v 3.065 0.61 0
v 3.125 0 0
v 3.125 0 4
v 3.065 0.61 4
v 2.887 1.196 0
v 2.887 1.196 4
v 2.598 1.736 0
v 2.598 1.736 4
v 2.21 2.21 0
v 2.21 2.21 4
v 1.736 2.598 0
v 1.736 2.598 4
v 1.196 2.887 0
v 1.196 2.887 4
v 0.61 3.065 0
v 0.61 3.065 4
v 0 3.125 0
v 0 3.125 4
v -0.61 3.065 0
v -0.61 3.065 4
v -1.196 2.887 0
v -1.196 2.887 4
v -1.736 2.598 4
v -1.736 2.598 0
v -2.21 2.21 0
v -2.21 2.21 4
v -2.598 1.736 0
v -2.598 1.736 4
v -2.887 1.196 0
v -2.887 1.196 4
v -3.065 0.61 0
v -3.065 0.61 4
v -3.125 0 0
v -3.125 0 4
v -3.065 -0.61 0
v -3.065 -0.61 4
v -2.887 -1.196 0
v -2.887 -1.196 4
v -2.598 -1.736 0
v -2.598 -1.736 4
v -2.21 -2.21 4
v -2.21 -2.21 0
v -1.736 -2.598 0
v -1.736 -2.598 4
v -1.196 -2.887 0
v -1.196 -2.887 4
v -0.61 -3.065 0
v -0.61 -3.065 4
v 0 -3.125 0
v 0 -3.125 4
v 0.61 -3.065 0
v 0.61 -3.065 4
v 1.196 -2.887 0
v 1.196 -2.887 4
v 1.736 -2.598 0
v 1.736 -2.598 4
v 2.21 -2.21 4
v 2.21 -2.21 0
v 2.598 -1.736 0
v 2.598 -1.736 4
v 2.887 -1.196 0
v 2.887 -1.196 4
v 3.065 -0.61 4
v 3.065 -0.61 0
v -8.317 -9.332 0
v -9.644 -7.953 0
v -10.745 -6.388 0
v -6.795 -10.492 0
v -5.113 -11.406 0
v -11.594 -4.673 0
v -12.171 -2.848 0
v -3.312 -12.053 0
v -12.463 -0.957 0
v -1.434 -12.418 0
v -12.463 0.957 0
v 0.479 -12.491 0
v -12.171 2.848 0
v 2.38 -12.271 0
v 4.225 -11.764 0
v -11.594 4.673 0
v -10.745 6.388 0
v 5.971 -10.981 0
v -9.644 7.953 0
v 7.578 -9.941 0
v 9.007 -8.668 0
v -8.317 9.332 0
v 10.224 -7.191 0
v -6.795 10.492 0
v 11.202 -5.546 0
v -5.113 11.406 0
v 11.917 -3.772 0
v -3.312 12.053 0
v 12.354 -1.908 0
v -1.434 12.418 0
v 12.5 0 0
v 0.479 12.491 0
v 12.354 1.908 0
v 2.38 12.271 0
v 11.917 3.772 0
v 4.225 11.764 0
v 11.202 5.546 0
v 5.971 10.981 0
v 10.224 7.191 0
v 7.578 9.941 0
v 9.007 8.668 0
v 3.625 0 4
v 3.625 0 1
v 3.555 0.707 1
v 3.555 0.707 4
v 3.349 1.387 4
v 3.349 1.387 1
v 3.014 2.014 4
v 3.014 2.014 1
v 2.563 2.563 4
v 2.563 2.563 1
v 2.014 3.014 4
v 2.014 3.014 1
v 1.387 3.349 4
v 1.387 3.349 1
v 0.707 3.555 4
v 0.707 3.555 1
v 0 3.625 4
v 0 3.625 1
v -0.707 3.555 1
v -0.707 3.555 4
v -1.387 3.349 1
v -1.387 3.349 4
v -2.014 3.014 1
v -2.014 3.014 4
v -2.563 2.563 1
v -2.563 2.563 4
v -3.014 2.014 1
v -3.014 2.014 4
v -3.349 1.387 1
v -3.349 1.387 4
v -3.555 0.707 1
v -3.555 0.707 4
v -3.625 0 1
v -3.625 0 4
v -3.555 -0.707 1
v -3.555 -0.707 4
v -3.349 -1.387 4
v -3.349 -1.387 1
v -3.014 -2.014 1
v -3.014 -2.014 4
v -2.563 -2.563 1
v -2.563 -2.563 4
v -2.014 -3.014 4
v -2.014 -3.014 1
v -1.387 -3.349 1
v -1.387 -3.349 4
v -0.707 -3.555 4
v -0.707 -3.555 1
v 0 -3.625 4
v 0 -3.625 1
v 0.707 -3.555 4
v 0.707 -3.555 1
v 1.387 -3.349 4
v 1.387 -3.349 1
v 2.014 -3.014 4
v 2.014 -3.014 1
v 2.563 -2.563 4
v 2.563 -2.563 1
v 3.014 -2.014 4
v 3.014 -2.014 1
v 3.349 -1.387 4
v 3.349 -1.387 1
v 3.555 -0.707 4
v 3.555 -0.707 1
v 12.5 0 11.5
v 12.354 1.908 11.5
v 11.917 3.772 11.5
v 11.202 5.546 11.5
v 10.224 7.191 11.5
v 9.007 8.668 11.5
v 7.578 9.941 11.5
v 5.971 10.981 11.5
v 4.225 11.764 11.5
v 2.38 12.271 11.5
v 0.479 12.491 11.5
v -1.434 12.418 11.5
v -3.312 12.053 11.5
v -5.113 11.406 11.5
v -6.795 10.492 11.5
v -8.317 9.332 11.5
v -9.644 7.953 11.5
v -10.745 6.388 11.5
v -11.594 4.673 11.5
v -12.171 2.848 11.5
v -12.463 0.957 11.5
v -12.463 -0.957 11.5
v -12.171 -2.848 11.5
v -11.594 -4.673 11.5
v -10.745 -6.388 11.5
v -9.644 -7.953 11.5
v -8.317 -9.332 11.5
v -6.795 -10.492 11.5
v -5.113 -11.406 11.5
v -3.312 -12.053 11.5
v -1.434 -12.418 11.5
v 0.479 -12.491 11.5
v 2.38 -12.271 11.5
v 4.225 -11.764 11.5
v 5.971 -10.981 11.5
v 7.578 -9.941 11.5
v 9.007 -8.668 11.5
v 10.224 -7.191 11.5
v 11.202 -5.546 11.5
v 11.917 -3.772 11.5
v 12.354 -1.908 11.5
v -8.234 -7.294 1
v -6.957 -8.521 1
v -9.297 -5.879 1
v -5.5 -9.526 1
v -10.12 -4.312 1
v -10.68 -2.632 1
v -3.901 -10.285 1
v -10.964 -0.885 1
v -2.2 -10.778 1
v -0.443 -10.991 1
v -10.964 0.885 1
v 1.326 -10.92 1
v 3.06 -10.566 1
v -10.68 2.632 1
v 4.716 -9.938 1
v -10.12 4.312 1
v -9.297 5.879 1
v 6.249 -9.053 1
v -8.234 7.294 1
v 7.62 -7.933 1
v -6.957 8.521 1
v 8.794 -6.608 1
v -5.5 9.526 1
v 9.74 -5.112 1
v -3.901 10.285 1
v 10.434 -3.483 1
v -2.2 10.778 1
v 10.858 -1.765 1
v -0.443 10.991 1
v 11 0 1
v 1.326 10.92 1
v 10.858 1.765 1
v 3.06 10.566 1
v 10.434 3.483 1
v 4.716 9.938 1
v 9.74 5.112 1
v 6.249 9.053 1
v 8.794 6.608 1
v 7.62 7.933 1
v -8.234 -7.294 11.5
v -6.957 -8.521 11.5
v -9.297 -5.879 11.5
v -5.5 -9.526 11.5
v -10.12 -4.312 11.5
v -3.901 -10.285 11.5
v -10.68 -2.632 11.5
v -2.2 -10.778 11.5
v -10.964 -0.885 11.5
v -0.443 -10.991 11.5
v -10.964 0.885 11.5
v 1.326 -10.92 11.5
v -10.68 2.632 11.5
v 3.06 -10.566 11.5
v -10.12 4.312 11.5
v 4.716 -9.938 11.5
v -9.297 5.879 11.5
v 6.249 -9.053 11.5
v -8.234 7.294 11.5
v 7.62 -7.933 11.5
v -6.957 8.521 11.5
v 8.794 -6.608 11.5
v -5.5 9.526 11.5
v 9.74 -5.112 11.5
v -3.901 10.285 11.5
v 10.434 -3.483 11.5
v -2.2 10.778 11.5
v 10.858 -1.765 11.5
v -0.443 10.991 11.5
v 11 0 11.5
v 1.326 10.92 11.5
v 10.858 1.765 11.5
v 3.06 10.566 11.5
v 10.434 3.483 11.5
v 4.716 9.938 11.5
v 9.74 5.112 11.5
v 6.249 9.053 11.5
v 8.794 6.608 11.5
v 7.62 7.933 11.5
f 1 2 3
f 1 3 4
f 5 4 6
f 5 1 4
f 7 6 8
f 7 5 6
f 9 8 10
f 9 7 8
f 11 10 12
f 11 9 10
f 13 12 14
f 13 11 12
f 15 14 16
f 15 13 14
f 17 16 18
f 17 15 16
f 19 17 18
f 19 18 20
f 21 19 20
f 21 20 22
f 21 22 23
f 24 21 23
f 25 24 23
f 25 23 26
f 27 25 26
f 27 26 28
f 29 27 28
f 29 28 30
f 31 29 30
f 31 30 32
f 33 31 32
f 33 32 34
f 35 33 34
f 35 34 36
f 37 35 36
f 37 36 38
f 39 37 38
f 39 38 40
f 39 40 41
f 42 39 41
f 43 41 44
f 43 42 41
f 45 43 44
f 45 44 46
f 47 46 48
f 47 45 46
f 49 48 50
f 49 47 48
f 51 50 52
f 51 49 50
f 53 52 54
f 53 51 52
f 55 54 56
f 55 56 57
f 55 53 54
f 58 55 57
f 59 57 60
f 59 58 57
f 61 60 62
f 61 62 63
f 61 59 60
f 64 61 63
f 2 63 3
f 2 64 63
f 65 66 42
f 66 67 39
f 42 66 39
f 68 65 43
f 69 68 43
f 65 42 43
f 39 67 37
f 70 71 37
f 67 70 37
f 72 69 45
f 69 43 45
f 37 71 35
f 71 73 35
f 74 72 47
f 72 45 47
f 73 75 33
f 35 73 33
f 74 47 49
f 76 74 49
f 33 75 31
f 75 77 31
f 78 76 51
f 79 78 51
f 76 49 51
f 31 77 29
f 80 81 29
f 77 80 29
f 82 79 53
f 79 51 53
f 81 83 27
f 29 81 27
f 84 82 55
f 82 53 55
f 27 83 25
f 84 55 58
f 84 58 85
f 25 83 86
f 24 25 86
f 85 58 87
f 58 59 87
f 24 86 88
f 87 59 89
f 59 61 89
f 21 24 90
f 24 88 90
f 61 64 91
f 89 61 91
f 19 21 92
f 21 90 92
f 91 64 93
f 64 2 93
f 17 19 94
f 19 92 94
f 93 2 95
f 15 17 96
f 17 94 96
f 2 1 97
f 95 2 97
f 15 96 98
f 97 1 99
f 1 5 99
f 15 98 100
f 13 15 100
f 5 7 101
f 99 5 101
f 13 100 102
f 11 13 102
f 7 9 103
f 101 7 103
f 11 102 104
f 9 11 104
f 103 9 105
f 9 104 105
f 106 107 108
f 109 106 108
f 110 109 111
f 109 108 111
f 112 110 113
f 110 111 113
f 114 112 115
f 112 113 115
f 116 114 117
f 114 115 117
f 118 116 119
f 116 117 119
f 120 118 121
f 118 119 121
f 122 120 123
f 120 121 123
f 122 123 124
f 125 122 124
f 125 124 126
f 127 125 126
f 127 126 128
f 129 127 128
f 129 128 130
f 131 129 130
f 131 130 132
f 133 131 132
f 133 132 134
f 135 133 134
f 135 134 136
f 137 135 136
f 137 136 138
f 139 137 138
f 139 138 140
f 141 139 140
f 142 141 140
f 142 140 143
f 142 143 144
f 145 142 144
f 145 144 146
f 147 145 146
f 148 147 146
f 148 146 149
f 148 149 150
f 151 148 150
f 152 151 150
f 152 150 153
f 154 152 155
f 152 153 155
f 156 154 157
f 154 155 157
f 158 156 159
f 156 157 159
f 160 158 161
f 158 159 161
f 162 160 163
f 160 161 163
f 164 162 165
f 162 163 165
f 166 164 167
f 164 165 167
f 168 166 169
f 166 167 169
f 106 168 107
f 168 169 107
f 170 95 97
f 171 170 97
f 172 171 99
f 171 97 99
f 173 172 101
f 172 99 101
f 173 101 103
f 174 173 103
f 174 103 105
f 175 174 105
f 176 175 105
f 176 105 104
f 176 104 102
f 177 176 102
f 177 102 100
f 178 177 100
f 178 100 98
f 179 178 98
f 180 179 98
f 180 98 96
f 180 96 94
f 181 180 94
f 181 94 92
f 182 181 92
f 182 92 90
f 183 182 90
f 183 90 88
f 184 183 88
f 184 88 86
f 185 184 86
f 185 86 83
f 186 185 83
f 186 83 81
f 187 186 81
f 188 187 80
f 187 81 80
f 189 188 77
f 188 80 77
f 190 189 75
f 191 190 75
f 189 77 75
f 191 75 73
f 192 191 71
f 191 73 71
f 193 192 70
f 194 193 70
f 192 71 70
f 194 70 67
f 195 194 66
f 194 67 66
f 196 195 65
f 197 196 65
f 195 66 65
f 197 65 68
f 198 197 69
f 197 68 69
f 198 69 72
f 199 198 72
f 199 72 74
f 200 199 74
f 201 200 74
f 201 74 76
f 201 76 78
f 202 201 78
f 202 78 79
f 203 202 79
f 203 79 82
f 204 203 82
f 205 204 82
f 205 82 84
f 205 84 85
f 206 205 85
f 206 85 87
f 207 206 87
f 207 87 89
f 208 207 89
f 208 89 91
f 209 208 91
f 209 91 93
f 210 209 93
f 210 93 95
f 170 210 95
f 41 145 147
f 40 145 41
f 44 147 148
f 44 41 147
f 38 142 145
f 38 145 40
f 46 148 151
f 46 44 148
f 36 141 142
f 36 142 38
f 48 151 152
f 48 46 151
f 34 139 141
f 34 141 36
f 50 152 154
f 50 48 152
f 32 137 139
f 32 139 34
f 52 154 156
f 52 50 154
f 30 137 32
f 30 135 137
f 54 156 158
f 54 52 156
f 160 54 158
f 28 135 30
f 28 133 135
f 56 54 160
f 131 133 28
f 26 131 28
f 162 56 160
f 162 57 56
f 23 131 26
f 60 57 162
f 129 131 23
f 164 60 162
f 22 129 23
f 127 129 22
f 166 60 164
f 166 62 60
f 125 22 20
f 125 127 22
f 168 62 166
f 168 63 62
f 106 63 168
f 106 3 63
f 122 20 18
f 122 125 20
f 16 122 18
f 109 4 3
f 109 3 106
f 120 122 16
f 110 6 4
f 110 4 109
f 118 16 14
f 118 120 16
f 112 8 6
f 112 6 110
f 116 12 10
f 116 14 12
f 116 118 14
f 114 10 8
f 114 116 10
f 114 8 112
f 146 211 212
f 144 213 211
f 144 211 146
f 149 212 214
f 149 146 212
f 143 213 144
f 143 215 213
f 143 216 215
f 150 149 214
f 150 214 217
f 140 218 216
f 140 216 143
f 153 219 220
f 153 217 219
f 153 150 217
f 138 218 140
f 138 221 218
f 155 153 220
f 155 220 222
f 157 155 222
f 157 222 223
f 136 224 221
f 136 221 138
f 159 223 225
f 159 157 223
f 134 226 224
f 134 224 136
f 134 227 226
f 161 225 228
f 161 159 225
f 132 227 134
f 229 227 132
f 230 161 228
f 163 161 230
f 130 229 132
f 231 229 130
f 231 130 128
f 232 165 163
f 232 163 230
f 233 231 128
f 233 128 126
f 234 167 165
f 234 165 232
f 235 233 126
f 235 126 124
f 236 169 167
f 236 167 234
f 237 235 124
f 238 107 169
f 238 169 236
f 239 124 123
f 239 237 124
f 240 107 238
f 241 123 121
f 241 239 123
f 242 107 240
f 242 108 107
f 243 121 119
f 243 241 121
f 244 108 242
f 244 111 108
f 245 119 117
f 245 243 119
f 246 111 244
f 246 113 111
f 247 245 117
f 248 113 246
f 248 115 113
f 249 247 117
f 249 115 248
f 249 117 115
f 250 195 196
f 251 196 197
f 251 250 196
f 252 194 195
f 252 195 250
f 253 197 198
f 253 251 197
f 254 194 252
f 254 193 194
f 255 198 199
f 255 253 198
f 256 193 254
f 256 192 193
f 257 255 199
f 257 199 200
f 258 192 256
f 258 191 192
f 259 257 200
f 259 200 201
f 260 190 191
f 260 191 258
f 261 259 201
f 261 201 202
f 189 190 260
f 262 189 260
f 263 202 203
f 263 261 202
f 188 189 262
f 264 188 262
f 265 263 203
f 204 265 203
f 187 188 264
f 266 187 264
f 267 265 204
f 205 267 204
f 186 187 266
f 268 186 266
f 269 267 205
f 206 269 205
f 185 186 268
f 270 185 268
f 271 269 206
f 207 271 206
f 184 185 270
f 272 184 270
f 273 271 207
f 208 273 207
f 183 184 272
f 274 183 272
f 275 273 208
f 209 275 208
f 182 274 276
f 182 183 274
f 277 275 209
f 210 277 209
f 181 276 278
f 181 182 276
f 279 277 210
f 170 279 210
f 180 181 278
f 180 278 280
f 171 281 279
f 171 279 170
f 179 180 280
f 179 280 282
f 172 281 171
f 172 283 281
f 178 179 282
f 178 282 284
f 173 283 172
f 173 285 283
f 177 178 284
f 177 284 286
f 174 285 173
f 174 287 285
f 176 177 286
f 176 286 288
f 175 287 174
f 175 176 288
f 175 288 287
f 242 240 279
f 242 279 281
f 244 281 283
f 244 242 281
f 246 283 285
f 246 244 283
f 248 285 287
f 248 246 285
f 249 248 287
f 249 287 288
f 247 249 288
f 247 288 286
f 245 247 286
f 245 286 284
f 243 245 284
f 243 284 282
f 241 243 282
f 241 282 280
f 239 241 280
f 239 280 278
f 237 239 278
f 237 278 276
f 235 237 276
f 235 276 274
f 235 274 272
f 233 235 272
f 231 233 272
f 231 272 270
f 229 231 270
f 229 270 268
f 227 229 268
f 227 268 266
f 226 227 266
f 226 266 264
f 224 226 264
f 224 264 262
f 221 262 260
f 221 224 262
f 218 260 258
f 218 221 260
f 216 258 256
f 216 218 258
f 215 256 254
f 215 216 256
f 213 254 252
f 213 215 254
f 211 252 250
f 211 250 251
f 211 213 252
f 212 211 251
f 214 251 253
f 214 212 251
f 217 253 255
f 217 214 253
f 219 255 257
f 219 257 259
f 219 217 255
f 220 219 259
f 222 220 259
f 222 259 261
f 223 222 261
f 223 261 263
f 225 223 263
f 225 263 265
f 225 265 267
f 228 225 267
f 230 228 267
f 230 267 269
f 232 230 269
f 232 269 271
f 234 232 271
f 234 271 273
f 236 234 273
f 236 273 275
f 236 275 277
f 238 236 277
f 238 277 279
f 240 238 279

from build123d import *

# Parameters (mm, degrees)
SKETCH_2_R      = 12.5
SKETCH_2_R_2    = 3.125
EXTRUDE_1_DEPTH = 1
SKETCH_2_4_R    = 3.625
SKETCH_2_4_R_2  = 3.125
EXTRUDE_2_DEPTH = 4
SKETCH_2_6_R    = 12.5
SKETCH_2_6_R_2  = 11
EXTRUDE_3_DEPTH = 11.5


with BuildPart() as part:
    # ｽｹｯﾁ2 → ﾎﾞｽ - 押し出し1 (new body)
    with BuildSketch(Plane.XY):
        Circle(SKETCH_2_R)
        Circle(SKETCH_2_R_2, mode=Mode.SUBTRACT)
    extrude(amount=EXTRUDE_1_DEPTH)

    # ｽｹｯﾁ2<4> → ﾎﾞｽ - 押し出し2 (add)
    with BuildSketch(Plane.XY):
        Circle(SKETCH_2_4_R)
        Circle(SKETCH_2_4_R_2, mode=Mode.SUBTRACT)
    extrude(amount=EXTRUDE_2_DEPTH)

    # ｽｹｯﾁ2<6> → ﾎﾞｽ - 押し出し3 (add)
    with BuildSketch(Plane.XY):
        Circle(SKETCH_2_6_R)
        Circle(SKETCH_2_6_R_2, mode=Mode.SUBTRACT)
    extrude(amount=EXTRUDE_3_DEPTH)


solid = part.part
